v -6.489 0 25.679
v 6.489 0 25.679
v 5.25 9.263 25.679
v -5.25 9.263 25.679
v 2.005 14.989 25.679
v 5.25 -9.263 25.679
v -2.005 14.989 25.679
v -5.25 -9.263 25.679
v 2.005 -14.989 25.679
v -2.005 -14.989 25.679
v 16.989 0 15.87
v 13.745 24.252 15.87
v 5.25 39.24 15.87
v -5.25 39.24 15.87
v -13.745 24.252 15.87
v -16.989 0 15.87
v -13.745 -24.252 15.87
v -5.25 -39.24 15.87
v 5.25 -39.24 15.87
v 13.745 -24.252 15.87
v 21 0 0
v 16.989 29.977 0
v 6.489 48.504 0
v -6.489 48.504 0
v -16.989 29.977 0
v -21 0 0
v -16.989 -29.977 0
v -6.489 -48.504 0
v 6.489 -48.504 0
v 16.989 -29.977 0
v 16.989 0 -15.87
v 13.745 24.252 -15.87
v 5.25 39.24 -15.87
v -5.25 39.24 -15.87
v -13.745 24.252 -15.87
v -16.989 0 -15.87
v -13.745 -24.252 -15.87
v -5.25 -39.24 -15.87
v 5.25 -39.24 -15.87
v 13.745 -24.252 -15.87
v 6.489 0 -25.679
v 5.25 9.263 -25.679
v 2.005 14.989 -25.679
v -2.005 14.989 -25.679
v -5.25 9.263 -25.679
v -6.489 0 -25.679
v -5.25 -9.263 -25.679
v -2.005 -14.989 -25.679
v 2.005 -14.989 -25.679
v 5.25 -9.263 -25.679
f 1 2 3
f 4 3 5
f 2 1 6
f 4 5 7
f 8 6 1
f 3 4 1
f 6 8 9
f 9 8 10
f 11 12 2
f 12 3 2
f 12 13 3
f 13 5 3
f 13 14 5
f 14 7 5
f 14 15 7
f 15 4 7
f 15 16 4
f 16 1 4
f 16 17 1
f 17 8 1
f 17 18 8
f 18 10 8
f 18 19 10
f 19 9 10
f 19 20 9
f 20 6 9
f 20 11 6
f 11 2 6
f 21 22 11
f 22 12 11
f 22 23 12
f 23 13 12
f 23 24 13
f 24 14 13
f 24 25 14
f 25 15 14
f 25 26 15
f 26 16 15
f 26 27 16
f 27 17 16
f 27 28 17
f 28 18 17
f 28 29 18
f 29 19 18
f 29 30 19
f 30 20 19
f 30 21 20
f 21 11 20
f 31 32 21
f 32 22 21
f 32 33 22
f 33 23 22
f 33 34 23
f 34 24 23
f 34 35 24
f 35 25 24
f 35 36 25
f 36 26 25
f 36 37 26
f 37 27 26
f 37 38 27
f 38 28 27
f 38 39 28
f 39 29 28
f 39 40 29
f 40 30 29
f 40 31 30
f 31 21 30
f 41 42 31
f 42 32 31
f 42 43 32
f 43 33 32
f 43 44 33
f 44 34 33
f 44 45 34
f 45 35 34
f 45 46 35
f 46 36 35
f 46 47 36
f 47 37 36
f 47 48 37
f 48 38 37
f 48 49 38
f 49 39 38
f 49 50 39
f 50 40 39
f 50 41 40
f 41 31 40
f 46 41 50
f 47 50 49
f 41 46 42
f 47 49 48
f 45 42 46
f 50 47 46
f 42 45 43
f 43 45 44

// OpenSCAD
// Generated by SolidPython 1.0.1 on 2020-07-29 00:46:48


scale(v = [7, 17, 9]) {
	sphere(r = 3);
}
/***********************************************
*********      SolidPython code:      **********
************************************************
 
# import packages: SolidPython
from solid import *
from solid.utils import *
from itertools import chain, combinations, permutations


class Resize:

    def __init__(self, scad_file):
        self.scad_file = scad_file
        #self.scad_file = import_scad(scad_file)
        # cone/cylinder param:
        self.r1 = 0
        self.r2 = 0
        self.h = 0
        # rectangular prism param:
        self.w = 0
        self.l = 0
        # ellipse param:
        self.r = 0

    # import OpenScad code (file name corresponds to shape)


    # classify shape + parameters
    def assign(self, param1, param2, param3):
        if self.scad_file == 'cone.scad':
            self.r1 = param1
            self.r2 = param2
            self.h = param3
        elif self.scad_file == 'cylinder.scad':
            self.r1 = param1
            self.r2 = param2
            self.h = param3
        elif self.scad_file == 'rectangularPrism.scad':
            self.h = param1
            self.l = param2
            self.w = param3
        else:
            self.r = param1
            self.h = param2

    # resize parameters
    def iterate(self):
        x = range(3, 20, 2)
        i = 1
        if self.scad_file == 'cone.scad':
            tempList = list(permutations(x, 2))
            for temp in tempList:
                param1 = temp[0]
                param2 = temp[1]
                filepath = 'produced_scad_files/' + 'cone' + str(param1) + '_' + str(param2) + '_' + '.scad'
                scad_render_to_file(cylinder(h=param1, r1=param2, r2=0), filepath)

        elif self.scad_file == 'cylinder.scad':
            tempList = list(permutations(x, 3))
            for temp in tempList:
                param1 = temp[0]
                param2 = temp[1]
                filepath = 'produced_scad_files/' + 'cylinder' + str(param1) + '_' + str(param2) + '_' + '.scad'
                scad_render_to_file(cylinder(h=param1, r1=param2, r2=param2), filepath)

        elif self.scad_file == 'rectangularPrism.scad':
            tempList = list(permutations(x, 3))
            for temp in tempList:
                param1 = temp[0]
                param2 = temp[1]
                param3 = temp[2]
                filepath = 'produced_scad_files/' + 'rectangularPrism' + str(param1) + '_' + str(param2) + '_' + str(
                    param3) + '.scad'
                scad_render_to_file(cube(size=(param1, param2, param3)), filepath)

        elif self.scad_file == 'ellipse.scad':
            tempList = list(permutations(x, 4))
            for temp in tempList:
                param1 = temp[0]
                param2 = temp[1]
                param3 = temp[2]
                param4 = temp[3]
                filepath = 'produced_scad_files/' + 'ellipse' + str(param1) + '_' + str(param2) + '_' + str(param3) + '_' + str(param4) + '.scad'
                scad_render_to_file(scale([param1, param2, param3])(sphere(r=param4)), filepath)

    def render_to_scadfile(self):
        scad_render_to_file(scad, 'example.scad') 
 
************************************************/
